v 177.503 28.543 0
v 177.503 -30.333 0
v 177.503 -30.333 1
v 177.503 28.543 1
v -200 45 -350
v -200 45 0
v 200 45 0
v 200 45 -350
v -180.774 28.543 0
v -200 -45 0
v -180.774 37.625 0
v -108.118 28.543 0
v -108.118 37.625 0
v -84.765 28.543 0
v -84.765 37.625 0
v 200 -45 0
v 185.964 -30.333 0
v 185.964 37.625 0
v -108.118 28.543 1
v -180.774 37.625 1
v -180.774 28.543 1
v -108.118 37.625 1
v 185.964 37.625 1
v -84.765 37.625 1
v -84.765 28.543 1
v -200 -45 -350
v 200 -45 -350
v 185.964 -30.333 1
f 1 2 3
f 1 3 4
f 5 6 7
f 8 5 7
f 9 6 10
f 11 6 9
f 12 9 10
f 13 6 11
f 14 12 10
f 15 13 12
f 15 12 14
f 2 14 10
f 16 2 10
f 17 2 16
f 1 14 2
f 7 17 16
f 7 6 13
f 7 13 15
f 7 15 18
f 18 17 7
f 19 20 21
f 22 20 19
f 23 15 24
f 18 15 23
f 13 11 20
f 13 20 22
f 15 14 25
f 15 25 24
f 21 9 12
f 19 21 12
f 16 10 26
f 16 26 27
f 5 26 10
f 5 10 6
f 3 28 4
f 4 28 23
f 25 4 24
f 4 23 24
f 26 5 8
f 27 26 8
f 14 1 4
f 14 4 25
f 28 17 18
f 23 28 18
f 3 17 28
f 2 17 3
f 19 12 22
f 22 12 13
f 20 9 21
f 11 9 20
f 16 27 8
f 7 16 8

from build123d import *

# Parameters (mm, degrees)
CROQUIS1_W              = 400
CROQUIS1_H              = 90
SALIENTE_EXTRUIR1_DEPTH = 350
CROQUIS2_W              = 72.65553302
CROQUIS2_H              = 9.081941628
SALIENTE_EXTRUIR2_DEPTH = 1


with BuildPart() as part:
    # Croquis1 → Saliente-Extruir1 (new body)
    with BuildSketch(Plane.XY):
        Rectangle(CROQUIS1_W, CROQUIS1_H)
    extrude(amount=-SALIENTE_EXTRUIR1_DEPTH)

    # Croquis2 → Saliente-Extruir2 (add)
    with BuildSketch(Plane.XY):
        with Locations((-144.446119219, 33.084215929)):
            Rectangle(CROQUIS2_W, CROQUIS2_H)
        Polygon((-84.764788524, 37.625186743), (185.963566659, 37.625186743), (185.963566659, 28.543245115), (185.963566659, -30.333468212), (177.50333461, -30.333468212), (177.50333461, 28.543245115), (-84.764788524, 28.543245115), align=None)
    extrude(amount=SALIENTE_EXTRUIR2_DEPTH)


solid = part.part
